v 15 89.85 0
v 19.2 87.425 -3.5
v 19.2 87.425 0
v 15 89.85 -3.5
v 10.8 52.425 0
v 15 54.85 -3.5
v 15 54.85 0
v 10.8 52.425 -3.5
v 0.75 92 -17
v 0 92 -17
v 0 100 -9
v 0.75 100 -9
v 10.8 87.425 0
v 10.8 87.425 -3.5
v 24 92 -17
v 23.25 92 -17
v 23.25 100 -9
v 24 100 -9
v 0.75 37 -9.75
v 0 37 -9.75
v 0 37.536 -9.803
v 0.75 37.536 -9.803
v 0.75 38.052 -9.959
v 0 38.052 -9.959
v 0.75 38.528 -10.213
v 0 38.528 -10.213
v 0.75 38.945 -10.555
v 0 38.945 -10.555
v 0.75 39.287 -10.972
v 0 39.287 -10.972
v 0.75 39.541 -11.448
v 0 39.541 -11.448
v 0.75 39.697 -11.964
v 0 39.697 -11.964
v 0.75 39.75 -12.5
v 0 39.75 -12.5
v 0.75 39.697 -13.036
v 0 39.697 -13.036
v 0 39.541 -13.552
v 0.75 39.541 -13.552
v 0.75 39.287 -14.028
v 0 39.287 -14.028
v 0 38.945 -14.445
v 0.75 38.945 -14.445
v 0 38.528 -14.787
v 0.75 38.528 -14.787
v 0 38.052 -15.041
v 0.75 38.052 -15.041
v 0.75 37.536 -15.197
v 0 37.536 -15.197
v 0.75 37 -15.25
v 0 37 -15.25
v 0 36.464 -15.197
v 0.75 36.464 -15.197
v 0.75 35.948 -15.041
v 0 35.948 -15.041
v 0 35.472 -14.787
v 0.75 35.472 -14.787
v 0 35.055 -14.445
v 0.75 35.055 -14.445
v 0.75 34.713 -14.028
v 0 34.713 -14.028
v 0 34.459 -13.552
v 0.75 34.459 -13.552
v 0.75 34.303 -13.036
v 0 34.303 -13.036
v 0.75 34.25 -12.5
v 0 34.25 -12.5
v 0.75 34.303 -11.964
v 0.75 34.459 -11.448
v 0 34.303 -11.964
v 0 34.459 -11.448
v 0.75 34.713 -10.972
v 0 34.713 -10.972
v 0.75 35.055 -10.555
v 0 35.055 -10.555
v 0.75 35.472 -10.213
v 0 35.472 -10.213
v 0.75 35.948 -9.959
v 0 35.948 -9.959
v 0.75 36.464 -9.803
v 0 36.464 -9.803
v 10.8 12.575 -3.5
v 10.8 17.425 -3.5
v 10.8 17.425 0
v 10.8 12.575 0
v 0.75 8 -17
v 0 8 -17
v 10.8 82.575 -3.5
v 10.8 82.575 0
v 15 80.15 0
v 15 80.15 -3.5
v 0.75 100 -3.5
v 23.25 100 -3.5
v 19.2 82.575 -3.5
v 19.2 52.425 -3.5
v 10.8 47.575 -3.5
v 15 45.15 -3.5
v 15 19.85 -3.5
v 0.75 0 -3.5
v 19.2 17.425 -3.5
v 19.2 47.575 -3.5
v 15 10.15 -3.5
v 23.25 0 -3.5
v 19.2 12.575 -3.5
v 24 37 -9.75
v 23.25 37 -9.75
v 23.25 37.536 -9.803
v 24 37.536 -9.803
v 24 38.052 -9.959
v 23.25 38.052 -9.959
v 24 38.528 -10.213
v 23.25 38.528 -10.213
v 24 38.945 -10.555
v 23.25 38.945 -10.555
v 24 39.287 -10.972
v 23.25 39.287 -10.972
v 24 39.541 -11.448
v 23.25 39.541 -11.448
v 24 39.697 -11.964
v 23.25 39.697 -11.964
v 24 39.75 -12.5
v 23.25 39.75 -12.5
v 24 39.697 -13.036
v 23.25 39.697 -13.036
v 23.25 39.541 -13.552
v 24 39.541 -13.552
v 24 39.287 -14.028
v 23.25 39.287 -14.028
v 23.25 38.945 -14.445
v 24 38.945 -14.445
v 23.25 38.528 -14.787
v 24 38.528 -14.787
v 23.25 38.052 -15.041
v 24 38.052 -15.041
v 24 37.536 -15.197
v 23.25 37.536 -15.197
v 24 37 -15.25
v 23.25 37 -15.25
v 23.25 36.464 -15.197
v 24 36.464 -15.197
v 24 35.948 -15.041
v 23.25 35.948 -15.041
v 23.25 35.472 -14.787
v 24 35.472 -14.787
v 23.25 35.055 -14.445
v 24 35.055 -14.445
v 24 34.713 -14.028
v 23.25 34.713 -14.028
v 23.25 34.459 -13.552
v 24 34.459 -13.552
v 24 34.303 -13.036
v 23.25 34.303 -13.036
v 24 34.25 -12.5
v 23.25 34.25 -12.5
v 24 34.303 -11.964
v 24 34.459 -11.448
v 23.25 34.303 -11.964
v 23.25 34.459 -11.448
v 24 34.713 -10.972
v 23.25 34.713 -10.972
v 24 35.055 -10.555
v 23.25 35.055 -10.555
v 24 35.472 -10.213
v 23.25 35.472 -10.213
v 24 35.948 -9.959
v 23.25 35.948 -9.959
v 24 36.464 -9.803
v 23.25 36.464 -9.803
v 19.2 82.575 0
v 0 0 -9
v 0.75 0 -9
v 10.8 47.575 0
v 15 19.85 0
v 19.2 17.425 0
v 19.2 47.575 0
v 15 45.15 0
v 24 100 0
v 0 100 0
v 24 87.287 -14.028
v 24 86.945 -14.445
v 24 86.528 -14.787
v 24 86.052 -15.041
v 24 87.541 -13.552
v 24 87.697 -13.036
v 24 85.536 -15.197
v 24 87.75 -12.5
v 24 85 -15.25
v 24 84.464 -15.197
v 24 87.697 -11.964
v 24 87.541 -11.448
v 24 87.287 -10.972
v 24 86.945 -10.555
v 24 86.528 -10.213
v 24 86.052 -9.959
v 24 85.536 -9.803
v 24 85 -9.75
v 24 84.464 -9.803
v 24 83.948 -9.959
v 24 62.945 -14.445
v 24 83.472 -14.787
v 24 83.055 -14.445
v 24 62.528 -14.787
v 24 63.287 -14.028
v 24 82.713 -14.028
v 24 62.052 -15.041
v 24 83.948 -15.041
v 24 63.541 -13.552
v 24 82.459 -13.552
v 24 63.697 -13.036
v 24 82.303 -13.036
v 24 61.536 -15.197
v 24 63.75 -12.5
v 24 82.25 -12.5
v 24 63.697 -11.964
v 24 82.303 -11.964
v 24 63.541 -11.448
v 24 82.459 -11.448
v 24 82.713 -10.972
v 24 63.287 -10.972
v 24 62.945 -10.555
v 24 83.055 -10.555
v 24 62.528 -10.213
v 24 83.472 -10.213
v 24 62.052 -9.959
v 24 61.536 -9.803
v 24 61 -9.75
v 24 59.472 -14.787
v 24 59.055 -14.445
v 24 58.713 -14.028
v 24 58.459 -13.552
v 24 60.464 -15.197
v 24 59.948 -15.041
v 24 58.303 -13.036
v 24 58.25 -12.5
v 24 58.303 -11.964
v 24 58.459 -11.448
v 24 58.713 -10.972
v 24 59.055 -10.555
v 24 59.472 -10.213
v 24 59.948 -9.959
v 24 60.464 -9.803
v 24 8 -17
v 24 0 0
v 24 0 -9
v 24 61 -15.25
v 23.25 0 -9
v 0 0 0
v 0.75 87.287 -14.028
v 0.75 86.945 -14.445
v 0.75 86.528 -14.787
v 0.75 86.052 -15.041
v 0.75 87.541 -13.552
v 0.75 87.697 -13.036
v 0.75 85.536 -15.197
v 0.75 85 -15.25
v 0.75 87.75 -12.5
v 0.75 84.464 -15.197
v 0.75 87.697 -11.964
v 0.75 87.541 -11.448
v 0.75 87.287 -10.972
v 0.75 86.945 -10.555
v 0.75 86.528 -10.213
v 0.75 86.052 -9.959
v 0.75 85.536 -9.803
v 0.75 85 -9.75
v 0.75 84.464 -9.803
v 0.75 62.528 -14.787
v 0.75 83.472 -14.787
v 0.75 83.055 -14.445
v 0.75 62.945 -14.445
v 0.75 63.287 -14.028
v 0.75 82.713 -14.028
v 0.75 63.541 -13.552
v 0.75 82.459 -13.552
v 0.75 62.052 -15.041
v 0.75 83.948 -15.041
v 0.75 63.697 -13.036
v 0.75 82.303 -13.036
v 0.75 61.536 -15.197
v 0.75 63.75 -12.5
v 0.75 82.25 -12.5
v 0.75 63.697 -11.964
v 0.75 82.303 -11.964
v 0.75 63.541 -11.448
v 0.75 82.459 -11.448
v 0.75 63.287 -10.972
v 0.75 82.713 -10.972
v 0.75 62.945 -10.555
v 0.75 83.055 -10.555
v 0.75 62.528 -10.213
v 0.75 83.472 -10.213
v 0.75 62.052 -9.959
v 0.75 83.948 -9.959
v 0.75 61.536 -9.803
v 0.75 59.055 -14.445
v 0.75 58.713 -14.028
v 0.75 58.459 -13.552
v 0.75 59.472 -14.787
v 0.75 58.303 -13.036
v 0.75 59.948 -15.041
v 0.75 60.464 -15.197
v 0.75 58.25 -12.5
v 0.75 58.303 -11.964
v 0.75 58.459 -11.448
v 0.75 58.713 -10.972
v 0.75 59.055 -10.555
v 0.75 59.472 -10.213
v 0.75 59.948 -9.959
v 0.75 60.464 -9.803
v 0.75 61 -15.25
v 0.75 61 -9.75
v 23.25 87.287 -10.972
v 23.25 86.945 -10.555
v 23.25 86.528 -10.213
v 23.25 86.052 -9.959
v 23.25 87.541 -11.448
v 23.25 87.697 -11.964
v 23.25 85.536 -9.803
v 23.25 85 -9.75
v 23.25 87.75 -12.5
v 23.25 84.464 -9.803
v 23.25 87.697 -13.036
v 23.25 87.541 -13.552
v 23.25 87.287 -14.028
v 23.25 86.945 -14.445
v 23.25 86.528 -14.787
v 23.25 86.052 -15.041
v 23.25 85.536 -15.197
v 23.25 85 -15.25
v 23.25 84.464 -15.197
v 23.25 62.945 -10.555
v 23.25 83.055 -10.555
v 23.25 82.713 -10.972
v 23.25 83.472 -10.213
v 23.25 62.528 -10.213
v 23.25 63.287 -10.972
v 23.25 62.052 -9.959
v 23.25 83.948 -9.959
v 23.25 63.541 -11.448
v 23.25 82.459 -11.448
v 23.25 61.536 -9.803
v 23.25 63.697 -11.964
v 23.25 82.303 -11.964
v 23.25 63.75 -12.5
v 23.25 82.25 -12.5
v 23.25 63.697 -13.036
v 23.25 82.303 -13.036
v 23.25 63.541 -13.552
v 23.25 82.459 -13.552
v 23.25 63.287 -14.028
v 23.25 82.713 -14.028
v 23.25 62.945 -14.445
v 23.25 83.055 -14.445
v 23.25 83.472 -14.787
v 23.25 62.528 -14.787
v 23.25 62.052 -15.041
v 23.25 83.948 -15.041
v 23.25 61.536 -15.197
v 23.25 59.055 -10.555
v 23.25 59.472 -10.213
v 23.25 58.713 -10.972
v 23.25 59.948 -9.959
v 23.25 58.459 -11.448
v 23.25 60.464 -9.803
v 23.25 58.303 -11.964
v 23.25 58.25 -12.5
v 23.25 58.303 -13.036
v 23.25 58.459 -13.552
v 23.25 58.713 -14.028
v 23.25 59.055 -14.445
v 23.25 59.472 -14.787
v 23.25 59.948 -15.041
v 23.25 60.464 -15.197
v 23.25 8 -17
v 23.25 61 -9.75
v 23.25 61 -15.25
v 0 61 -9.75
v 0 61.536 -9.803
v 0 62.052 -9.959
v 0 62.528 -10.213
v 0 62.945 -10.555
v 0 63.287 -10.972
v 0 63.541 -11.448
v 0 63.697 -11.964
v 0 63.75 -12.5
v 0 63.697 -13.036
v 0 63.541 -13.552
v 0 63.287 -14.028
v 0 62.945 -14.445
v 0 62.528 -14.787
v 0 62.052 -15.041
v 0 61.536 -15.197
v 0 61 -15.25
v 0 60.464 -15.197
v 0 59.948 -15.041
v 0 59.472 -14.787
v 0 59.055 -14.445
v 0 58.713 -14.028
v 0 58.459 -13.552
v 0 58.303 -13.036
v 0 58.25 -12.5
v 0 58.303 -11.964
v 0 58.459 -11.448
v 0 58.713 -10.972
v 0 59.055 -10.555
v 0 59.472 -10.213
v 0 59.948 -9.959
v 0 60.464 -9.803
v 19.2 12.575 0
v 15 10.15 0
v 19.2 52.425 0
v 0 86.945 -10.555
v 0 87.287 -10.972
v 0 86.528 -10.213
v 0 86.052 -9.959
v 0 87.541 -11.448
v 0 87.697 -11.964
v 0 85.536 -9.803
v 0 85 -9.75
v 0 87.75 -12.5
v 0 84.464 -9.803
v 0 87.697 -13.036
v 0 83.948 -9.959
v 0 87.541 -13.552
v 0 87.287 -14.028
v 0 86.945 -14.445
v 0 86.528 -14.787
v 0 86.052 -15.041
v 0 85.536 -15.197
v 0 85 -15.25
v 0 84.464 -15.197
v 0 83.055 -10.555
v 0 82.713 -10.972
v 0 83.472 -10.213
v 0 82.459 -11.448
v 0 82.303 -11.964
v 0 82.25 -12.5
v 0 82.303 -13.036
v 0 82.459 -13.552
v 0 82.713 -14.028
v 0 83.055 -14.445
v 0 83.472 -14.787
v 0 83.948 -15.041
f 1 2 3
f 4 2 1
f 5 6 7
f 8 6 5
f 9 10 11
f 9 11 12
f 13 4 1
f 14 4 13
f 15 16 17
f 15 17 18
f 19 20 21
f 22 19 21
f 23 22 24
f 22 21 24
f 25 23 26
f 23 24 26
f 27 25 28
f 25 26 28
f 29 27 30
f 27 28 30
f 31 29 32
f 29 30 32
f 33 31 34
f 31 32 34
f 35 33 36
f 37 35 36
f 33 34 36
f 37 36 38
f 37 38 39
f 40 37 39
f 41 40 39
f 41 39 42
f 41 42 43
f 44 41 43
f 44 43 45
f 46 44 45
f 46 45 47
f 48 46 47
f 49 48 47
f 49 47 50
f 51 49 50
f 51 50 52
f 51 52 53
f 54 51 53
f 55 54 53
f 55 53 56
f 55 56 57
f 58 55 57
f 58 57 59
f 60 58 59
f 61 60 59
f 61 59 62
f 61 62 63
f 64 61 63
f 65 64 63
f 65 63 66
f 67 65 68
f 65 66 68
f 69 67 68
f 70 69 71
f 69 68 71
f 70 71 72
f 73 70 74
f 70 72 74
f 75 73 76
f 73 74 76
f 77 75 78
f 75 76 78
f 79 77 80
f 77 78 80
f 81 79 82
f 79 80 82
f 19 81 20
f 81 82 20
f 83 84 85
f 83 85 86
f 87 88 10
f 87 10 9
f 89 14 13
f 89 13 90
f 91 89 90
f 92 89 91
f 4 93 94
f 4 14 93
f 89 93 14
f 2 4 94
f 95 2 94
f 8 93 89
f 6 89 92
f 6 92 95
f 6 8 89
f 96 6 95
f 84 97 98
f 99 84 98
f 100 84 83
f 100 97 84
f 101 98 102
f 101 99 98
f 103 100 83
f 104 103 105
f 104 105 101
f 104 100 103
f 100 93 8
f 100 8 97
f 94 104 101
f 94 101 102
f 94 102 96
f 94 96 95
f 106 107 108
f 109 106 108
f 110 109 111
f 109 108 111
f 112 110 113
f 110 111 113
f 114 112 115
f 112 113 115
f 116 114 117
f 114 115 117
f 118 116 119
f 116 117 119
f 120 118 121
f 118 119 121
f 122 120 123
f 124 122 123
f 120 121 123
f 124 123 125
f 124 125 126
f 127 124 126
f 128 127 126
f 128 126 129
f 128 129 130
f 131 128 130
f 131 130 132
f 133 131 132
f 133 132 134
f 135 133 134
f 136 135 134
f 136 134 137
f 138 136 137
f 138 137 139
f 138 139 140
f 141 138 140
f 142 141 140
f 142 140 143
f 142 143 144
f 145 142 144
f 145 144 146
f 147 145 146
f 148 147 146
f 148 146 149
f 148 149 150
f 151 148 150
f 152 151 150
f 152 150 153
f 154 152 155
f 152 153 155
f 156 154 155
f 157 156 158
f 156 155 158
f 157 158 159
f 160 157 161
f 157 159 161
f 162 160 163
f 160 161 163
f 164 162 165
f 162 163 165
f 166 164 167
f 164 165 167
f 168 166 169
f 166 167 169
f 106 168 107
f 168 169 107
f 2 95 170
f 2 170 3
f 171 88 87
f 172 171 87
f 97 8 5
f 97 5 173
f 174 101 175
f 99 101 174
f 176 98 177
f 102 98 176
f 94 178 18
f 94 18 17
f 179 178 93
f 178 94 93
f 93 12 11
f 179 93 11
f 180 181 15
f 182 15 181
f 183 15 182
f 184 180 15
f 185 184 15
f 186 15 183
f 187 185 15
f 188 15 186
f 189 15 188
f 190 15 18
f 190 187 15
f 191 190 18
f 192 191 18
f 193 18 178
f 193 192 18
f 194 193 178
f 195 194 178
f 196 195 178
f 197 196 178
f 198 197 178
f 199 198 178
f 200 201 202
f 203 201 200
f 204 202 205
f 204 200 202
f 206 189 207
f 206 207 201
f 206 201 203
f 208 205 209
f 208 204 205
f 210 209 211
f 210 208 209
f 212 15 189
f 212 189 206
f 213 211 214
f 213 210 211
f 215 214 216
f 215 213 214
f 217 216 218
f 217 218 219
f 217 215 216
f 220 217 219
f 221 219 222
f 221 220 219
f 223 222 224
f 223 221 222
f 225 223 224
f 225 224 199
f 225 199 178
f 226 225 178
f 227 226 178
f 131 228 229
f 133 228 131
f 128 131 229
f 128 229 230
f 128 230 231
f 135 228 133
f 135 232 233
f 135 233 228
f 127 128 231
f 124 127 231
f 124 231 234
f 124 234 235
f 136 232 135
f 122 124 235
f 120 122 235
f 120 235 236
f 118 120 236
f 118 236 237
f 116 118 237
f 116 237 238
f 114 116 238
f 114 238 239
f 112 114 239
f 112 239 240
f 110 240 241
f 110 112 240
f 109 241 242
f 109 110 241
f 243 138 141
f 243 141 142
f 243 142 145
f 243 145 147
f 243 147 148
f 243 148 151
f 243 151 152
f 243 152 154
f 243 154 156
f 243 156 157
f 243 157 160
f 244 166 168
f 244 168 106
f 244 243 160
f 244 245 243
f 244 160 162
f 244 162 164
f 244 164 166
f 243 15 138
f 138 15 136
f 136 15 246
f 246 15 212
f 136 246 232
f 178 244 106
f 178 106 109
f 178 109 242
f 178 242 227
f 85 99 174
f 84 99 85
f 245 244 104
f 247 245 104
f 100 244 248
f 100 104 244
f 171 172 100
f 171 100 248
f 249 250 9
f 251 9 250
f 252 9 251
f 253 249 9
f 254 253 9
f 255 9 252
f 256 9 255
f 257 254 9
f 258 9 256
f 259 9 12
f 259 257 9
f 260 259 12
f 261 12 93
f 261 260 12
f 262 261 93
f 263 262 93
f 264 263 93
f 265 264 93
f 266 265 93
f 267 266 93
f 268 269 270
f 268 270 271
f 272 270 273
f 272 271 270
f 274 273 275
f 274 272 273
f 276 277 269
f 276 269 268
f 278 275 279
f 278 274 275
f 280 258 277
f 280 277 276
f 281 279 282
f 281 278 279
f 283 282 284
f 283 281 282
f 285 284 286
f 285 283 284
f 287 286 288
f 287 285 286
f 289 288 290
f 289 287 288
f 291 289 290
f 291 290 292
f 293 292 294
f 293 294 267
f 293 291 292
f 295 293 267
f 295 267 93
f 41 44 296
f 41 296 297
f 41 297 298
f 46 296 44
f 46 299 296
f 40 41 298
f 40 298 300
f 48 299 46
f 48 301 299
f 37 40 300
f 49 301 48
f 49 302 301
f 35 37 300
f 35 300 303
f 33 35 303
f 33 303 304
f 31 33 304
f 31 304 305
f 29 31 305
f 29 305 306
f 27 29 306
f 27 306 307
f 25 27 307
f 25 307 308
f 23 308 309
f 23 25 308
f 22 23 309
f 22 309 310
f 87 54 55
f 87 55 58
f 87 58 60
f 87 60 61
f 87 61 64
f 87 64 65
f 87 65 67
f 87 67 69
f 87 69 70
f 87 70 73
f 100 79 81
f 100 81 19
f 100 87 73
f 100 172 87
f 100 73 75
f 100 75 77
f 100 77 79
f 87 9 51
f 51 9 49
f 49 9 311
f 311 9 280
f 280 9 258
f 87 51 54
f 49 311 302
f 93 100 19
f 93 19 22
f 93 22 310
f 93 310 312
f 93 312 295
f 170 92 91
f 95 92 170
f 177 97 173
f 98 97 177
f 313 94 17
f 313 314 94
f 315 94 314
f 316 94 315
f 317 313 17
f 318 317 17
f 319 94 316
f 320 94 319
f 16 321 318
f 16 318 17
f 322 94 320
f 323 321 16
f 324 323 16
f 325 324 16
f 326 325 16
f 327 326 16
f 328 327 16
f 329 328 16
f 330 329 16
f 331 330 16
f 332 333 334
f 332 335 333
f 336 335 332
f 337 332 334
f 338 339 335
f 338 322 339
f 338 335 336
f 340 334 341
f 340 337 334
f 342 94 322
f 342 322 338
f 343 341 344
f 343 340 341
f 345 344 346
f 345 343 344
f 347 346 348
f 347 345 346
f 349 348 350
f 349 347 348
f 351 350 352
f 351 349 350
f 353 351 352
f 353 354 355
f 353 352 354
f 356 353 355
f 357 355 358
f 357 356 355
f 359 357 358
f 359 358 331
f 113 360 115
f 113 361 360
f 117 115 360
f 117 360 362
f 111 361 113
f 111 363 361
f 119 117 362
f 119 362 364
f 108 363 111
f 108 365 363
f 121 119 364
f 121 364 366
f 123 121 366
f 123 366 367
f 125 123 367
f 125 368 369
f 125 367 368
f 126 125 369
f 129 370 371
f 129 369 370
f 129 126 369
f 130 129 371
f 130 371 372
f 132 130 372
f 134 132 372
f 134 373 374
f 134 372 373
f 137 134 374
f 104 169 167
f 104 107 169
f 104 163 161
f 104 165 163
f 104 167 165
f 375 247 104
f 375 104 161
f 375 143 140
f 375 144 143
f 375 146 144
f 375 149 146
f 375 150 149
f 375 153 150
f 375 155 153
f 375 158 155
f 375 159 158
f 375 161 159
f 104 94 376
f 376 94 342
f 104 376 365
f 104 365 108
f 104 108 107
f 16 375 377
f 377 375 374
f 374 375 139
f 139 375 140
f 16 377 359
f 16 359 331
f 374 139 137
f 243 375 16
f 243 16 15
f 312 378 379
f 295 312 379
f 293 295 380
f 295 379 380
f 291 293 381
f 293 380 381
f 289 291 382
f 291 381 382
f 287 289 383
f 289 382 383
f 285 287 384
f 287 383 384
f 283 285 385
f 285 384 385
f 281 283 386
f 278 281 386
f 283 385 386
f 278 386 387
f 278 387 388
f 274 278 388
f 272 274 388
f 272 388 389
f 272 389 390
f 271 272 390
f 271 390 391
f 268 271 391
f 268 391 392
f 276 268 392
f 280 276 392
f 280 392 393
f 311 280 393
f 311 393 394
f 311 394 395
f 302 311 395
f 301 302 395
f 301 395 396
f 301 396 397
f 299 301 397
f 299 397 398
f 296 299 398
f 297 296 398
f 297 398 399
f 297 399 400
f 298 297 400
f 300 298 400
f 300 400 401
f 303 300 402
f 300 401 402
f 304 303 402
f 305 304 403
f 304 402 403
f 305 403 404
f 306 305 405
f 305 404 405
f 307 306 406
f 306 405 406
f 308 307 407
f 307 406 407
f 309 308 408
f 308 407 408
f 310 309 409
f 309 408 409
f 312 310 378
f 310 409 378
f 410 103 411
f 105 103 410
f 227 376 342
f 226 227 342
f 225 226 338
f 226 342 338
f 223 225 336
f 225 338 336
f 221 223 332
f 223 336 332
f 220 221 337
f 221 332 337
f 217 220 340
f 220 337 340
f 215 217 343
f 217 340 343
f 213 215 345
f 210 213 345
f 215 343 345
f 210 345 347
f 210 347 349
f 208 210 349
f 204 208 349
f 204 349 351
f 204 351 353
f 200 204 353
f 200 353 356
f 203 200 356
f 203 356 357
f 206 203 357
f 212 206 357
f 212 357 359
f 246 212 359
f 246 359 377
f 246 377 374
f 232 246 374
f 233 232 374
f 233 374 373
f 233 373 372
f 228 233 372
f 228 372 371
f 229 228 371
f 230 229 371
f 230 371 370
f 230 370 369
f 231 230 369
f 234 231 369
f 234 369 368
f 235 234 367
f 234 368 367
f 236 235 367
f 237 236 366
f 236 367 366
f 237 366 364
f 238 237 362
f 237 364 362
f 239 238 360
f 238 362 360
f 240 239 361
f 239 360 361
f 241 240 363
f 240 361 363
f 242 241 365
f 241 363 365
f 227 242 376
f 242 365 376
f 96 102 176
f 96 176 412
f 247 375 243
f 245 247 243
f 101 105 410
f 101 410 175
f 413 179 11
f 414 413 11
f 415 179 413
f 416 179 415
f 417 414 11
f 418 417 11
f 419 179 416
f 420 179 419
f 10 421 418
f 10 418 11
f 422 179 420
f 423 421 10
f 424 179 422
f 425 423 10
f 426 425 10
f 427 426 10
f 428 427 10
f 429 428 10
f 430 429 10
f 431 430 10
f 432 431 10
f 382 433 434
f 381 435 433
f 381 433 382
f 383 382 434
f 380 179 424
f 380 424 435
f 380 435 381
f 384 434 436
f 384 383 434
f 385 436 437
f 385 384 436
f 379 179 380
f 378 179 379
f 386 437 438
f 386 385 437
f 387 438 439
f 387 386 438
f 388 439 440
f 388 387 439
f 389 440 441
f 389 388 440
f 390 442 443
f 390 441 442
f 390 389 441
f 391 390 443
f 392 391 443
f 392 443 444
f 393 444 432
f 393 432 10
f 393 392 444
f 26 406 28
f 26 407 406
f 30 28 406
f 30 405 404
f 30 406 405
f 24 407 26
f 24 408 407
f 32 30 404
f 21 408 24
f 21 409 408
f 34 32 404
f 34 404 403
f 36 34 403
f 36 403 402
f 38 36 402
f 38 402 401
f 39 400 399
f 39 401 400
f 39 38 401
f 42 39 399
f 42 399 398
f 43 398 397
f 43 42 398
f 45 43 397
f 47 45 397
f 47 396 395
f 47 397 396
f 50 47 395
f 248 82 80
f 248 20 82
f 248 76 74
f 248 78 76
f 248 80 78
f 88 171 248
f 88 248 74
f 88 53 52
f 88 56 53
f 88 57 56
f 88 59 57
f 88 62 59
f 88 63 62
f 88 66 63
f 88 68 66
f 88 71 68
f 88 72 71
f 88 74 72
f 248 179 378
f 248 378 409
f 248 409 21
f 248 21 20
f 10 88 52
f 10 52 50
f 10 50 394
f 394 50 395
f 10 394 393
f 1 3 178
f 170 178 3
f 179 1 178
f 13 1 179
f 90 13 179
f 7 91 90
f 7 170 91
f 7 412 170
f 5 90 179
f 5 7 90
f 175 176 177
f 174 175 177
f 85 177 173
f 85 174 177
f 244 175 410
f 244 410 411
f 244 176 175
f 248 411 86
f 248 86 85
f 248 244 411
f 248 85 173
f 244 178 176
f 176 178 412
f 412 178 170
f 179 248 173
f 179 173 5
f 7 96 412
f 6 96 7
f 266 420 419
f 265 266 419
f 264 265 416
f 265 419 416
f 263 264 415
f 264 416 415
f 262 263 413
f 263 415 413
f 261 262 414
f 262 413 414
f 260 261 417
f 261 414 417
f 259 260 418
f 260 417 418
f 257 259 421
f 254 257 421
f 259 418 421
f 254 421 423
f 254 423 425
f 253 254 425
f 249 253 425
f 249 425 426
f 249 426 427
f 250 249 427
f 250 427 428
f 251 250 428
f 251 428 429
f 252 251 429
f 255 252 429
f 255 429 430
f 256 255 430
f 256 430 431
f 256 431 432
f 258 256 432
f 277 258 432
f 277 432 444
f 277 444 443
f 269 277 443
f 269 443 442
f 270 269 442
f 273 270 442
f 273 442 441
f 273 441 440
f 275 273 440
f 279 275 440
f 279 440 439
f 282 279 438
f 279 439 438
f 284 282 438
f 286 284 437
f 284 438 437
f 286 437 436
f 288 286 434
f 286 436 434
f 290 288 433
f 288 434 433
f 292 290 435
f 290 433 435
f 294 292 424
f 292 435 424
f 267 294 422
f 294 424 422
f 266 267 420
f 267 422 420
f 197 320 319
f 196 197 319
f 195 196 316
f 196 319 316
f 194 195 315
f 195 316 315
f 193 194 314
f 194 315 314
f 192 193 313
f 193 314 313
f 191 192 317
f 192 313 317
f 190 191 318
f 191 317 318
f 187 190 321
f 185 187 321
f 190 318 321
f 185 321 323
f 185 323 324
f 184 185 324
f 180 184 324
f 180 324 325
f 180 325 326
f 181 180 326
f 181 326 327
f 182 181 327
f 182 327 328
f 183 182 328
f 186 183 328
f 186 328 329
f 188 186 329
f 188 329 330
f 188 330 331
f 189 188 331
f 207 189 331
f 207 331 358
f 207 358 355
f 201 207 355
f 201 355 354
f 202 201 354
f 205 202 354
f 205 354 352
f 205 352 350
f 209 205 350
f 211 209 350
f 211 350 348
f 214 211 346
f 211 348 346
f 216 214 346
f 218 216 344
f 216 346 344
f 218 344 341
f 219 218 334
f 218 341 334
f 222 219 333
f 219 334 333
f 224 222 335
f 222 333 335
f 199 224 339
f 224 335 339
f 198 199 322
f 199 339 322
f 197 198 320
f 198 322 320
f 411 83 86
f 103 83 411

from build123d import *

# Parameters (mm, degrees)
BOSS_EXTRUDE1_DEPTH     = 100
CUT_EXTRUDE1_DEPTH      = 105.235310716
CUT_EXTRUDE1_DEPTH_BACK = 105.235310716
M5_CLEARANCE_HOLE1_D    = 5.5
CHAMFER1_SIZE           = 8


with BuildPart() as part:
    # Sketch1 → Boss-Extrude1 (new body)
    with BuildSketch(Plane(origin=(0, 0, 0), x_dir=(1, 0, 0), z_dir=(0, 1, 0))):
        Polygon((0, 0), (0, 17), (0.75, 17), (0.75, 3.5), (23.25, 3.5), (23.25, 17), (24, 17), (24, 0), align=None)
    extrude(amount=BOSS_EXTRUDE1_DEPTH)

    # Sketch2 → Cut-Extrude1 (cut, two sides: drawn at the far end of the back side and taken through both)
    with BuildSketch(Plane.XY.offset(-CUT_EXTRUDE1_DEPTH_BACK)):
        Polygon((10.8, 52.424871131), (10.8, 47.575128869), (15, 45.150257739), (19.2, 47.575128869), (19.2, 52.424871131), (15, 54.849742261), align=None)
        Polygon((19.2, 12.575128869), (19.2, 17.424871131), (15, 19.849742261), (10.8, 17.424871131), (10.8, 12.575128869), (15, 10.150257739), align=None)
        Polygon((10.8, 87.424871131), (10.8, 82.575128869), (15, 80.150257739), (19.2, 82.575128869), (19.2, 87.424871131), (15, 89.849742261), align=None)
    extrude(amount=CUT_EXTRUDE1_DEPTH + CUT_EXTRUDE1_DEPTH_BACK, mode=Mode.SUBTRACT)

    # M5 Clearance Hole1 (through all)
    with Locations(Plane(origin=(24, 0, 0), x_dir=(0, 0, -1), z_dir=(1, 0, 0))):
        with Locations((12.5, 85), (12.5, 37), (12.5, 61)):
            Hole(M5_CLEARANCE_HOLE1_D / 2)

    # Chamfer1
    chamfer1_edges = [part.edges().sort_by_distance(p)[0] for p in [
        (23.625, 0, -17),
        (23.625, 100, -17),
        (0.375, 100, -17),
        (0.375, 0, -17),
    ]]
    chamfer(chamfer1_edges, length=CHAMFER1_SIZE)


solid = part.part
